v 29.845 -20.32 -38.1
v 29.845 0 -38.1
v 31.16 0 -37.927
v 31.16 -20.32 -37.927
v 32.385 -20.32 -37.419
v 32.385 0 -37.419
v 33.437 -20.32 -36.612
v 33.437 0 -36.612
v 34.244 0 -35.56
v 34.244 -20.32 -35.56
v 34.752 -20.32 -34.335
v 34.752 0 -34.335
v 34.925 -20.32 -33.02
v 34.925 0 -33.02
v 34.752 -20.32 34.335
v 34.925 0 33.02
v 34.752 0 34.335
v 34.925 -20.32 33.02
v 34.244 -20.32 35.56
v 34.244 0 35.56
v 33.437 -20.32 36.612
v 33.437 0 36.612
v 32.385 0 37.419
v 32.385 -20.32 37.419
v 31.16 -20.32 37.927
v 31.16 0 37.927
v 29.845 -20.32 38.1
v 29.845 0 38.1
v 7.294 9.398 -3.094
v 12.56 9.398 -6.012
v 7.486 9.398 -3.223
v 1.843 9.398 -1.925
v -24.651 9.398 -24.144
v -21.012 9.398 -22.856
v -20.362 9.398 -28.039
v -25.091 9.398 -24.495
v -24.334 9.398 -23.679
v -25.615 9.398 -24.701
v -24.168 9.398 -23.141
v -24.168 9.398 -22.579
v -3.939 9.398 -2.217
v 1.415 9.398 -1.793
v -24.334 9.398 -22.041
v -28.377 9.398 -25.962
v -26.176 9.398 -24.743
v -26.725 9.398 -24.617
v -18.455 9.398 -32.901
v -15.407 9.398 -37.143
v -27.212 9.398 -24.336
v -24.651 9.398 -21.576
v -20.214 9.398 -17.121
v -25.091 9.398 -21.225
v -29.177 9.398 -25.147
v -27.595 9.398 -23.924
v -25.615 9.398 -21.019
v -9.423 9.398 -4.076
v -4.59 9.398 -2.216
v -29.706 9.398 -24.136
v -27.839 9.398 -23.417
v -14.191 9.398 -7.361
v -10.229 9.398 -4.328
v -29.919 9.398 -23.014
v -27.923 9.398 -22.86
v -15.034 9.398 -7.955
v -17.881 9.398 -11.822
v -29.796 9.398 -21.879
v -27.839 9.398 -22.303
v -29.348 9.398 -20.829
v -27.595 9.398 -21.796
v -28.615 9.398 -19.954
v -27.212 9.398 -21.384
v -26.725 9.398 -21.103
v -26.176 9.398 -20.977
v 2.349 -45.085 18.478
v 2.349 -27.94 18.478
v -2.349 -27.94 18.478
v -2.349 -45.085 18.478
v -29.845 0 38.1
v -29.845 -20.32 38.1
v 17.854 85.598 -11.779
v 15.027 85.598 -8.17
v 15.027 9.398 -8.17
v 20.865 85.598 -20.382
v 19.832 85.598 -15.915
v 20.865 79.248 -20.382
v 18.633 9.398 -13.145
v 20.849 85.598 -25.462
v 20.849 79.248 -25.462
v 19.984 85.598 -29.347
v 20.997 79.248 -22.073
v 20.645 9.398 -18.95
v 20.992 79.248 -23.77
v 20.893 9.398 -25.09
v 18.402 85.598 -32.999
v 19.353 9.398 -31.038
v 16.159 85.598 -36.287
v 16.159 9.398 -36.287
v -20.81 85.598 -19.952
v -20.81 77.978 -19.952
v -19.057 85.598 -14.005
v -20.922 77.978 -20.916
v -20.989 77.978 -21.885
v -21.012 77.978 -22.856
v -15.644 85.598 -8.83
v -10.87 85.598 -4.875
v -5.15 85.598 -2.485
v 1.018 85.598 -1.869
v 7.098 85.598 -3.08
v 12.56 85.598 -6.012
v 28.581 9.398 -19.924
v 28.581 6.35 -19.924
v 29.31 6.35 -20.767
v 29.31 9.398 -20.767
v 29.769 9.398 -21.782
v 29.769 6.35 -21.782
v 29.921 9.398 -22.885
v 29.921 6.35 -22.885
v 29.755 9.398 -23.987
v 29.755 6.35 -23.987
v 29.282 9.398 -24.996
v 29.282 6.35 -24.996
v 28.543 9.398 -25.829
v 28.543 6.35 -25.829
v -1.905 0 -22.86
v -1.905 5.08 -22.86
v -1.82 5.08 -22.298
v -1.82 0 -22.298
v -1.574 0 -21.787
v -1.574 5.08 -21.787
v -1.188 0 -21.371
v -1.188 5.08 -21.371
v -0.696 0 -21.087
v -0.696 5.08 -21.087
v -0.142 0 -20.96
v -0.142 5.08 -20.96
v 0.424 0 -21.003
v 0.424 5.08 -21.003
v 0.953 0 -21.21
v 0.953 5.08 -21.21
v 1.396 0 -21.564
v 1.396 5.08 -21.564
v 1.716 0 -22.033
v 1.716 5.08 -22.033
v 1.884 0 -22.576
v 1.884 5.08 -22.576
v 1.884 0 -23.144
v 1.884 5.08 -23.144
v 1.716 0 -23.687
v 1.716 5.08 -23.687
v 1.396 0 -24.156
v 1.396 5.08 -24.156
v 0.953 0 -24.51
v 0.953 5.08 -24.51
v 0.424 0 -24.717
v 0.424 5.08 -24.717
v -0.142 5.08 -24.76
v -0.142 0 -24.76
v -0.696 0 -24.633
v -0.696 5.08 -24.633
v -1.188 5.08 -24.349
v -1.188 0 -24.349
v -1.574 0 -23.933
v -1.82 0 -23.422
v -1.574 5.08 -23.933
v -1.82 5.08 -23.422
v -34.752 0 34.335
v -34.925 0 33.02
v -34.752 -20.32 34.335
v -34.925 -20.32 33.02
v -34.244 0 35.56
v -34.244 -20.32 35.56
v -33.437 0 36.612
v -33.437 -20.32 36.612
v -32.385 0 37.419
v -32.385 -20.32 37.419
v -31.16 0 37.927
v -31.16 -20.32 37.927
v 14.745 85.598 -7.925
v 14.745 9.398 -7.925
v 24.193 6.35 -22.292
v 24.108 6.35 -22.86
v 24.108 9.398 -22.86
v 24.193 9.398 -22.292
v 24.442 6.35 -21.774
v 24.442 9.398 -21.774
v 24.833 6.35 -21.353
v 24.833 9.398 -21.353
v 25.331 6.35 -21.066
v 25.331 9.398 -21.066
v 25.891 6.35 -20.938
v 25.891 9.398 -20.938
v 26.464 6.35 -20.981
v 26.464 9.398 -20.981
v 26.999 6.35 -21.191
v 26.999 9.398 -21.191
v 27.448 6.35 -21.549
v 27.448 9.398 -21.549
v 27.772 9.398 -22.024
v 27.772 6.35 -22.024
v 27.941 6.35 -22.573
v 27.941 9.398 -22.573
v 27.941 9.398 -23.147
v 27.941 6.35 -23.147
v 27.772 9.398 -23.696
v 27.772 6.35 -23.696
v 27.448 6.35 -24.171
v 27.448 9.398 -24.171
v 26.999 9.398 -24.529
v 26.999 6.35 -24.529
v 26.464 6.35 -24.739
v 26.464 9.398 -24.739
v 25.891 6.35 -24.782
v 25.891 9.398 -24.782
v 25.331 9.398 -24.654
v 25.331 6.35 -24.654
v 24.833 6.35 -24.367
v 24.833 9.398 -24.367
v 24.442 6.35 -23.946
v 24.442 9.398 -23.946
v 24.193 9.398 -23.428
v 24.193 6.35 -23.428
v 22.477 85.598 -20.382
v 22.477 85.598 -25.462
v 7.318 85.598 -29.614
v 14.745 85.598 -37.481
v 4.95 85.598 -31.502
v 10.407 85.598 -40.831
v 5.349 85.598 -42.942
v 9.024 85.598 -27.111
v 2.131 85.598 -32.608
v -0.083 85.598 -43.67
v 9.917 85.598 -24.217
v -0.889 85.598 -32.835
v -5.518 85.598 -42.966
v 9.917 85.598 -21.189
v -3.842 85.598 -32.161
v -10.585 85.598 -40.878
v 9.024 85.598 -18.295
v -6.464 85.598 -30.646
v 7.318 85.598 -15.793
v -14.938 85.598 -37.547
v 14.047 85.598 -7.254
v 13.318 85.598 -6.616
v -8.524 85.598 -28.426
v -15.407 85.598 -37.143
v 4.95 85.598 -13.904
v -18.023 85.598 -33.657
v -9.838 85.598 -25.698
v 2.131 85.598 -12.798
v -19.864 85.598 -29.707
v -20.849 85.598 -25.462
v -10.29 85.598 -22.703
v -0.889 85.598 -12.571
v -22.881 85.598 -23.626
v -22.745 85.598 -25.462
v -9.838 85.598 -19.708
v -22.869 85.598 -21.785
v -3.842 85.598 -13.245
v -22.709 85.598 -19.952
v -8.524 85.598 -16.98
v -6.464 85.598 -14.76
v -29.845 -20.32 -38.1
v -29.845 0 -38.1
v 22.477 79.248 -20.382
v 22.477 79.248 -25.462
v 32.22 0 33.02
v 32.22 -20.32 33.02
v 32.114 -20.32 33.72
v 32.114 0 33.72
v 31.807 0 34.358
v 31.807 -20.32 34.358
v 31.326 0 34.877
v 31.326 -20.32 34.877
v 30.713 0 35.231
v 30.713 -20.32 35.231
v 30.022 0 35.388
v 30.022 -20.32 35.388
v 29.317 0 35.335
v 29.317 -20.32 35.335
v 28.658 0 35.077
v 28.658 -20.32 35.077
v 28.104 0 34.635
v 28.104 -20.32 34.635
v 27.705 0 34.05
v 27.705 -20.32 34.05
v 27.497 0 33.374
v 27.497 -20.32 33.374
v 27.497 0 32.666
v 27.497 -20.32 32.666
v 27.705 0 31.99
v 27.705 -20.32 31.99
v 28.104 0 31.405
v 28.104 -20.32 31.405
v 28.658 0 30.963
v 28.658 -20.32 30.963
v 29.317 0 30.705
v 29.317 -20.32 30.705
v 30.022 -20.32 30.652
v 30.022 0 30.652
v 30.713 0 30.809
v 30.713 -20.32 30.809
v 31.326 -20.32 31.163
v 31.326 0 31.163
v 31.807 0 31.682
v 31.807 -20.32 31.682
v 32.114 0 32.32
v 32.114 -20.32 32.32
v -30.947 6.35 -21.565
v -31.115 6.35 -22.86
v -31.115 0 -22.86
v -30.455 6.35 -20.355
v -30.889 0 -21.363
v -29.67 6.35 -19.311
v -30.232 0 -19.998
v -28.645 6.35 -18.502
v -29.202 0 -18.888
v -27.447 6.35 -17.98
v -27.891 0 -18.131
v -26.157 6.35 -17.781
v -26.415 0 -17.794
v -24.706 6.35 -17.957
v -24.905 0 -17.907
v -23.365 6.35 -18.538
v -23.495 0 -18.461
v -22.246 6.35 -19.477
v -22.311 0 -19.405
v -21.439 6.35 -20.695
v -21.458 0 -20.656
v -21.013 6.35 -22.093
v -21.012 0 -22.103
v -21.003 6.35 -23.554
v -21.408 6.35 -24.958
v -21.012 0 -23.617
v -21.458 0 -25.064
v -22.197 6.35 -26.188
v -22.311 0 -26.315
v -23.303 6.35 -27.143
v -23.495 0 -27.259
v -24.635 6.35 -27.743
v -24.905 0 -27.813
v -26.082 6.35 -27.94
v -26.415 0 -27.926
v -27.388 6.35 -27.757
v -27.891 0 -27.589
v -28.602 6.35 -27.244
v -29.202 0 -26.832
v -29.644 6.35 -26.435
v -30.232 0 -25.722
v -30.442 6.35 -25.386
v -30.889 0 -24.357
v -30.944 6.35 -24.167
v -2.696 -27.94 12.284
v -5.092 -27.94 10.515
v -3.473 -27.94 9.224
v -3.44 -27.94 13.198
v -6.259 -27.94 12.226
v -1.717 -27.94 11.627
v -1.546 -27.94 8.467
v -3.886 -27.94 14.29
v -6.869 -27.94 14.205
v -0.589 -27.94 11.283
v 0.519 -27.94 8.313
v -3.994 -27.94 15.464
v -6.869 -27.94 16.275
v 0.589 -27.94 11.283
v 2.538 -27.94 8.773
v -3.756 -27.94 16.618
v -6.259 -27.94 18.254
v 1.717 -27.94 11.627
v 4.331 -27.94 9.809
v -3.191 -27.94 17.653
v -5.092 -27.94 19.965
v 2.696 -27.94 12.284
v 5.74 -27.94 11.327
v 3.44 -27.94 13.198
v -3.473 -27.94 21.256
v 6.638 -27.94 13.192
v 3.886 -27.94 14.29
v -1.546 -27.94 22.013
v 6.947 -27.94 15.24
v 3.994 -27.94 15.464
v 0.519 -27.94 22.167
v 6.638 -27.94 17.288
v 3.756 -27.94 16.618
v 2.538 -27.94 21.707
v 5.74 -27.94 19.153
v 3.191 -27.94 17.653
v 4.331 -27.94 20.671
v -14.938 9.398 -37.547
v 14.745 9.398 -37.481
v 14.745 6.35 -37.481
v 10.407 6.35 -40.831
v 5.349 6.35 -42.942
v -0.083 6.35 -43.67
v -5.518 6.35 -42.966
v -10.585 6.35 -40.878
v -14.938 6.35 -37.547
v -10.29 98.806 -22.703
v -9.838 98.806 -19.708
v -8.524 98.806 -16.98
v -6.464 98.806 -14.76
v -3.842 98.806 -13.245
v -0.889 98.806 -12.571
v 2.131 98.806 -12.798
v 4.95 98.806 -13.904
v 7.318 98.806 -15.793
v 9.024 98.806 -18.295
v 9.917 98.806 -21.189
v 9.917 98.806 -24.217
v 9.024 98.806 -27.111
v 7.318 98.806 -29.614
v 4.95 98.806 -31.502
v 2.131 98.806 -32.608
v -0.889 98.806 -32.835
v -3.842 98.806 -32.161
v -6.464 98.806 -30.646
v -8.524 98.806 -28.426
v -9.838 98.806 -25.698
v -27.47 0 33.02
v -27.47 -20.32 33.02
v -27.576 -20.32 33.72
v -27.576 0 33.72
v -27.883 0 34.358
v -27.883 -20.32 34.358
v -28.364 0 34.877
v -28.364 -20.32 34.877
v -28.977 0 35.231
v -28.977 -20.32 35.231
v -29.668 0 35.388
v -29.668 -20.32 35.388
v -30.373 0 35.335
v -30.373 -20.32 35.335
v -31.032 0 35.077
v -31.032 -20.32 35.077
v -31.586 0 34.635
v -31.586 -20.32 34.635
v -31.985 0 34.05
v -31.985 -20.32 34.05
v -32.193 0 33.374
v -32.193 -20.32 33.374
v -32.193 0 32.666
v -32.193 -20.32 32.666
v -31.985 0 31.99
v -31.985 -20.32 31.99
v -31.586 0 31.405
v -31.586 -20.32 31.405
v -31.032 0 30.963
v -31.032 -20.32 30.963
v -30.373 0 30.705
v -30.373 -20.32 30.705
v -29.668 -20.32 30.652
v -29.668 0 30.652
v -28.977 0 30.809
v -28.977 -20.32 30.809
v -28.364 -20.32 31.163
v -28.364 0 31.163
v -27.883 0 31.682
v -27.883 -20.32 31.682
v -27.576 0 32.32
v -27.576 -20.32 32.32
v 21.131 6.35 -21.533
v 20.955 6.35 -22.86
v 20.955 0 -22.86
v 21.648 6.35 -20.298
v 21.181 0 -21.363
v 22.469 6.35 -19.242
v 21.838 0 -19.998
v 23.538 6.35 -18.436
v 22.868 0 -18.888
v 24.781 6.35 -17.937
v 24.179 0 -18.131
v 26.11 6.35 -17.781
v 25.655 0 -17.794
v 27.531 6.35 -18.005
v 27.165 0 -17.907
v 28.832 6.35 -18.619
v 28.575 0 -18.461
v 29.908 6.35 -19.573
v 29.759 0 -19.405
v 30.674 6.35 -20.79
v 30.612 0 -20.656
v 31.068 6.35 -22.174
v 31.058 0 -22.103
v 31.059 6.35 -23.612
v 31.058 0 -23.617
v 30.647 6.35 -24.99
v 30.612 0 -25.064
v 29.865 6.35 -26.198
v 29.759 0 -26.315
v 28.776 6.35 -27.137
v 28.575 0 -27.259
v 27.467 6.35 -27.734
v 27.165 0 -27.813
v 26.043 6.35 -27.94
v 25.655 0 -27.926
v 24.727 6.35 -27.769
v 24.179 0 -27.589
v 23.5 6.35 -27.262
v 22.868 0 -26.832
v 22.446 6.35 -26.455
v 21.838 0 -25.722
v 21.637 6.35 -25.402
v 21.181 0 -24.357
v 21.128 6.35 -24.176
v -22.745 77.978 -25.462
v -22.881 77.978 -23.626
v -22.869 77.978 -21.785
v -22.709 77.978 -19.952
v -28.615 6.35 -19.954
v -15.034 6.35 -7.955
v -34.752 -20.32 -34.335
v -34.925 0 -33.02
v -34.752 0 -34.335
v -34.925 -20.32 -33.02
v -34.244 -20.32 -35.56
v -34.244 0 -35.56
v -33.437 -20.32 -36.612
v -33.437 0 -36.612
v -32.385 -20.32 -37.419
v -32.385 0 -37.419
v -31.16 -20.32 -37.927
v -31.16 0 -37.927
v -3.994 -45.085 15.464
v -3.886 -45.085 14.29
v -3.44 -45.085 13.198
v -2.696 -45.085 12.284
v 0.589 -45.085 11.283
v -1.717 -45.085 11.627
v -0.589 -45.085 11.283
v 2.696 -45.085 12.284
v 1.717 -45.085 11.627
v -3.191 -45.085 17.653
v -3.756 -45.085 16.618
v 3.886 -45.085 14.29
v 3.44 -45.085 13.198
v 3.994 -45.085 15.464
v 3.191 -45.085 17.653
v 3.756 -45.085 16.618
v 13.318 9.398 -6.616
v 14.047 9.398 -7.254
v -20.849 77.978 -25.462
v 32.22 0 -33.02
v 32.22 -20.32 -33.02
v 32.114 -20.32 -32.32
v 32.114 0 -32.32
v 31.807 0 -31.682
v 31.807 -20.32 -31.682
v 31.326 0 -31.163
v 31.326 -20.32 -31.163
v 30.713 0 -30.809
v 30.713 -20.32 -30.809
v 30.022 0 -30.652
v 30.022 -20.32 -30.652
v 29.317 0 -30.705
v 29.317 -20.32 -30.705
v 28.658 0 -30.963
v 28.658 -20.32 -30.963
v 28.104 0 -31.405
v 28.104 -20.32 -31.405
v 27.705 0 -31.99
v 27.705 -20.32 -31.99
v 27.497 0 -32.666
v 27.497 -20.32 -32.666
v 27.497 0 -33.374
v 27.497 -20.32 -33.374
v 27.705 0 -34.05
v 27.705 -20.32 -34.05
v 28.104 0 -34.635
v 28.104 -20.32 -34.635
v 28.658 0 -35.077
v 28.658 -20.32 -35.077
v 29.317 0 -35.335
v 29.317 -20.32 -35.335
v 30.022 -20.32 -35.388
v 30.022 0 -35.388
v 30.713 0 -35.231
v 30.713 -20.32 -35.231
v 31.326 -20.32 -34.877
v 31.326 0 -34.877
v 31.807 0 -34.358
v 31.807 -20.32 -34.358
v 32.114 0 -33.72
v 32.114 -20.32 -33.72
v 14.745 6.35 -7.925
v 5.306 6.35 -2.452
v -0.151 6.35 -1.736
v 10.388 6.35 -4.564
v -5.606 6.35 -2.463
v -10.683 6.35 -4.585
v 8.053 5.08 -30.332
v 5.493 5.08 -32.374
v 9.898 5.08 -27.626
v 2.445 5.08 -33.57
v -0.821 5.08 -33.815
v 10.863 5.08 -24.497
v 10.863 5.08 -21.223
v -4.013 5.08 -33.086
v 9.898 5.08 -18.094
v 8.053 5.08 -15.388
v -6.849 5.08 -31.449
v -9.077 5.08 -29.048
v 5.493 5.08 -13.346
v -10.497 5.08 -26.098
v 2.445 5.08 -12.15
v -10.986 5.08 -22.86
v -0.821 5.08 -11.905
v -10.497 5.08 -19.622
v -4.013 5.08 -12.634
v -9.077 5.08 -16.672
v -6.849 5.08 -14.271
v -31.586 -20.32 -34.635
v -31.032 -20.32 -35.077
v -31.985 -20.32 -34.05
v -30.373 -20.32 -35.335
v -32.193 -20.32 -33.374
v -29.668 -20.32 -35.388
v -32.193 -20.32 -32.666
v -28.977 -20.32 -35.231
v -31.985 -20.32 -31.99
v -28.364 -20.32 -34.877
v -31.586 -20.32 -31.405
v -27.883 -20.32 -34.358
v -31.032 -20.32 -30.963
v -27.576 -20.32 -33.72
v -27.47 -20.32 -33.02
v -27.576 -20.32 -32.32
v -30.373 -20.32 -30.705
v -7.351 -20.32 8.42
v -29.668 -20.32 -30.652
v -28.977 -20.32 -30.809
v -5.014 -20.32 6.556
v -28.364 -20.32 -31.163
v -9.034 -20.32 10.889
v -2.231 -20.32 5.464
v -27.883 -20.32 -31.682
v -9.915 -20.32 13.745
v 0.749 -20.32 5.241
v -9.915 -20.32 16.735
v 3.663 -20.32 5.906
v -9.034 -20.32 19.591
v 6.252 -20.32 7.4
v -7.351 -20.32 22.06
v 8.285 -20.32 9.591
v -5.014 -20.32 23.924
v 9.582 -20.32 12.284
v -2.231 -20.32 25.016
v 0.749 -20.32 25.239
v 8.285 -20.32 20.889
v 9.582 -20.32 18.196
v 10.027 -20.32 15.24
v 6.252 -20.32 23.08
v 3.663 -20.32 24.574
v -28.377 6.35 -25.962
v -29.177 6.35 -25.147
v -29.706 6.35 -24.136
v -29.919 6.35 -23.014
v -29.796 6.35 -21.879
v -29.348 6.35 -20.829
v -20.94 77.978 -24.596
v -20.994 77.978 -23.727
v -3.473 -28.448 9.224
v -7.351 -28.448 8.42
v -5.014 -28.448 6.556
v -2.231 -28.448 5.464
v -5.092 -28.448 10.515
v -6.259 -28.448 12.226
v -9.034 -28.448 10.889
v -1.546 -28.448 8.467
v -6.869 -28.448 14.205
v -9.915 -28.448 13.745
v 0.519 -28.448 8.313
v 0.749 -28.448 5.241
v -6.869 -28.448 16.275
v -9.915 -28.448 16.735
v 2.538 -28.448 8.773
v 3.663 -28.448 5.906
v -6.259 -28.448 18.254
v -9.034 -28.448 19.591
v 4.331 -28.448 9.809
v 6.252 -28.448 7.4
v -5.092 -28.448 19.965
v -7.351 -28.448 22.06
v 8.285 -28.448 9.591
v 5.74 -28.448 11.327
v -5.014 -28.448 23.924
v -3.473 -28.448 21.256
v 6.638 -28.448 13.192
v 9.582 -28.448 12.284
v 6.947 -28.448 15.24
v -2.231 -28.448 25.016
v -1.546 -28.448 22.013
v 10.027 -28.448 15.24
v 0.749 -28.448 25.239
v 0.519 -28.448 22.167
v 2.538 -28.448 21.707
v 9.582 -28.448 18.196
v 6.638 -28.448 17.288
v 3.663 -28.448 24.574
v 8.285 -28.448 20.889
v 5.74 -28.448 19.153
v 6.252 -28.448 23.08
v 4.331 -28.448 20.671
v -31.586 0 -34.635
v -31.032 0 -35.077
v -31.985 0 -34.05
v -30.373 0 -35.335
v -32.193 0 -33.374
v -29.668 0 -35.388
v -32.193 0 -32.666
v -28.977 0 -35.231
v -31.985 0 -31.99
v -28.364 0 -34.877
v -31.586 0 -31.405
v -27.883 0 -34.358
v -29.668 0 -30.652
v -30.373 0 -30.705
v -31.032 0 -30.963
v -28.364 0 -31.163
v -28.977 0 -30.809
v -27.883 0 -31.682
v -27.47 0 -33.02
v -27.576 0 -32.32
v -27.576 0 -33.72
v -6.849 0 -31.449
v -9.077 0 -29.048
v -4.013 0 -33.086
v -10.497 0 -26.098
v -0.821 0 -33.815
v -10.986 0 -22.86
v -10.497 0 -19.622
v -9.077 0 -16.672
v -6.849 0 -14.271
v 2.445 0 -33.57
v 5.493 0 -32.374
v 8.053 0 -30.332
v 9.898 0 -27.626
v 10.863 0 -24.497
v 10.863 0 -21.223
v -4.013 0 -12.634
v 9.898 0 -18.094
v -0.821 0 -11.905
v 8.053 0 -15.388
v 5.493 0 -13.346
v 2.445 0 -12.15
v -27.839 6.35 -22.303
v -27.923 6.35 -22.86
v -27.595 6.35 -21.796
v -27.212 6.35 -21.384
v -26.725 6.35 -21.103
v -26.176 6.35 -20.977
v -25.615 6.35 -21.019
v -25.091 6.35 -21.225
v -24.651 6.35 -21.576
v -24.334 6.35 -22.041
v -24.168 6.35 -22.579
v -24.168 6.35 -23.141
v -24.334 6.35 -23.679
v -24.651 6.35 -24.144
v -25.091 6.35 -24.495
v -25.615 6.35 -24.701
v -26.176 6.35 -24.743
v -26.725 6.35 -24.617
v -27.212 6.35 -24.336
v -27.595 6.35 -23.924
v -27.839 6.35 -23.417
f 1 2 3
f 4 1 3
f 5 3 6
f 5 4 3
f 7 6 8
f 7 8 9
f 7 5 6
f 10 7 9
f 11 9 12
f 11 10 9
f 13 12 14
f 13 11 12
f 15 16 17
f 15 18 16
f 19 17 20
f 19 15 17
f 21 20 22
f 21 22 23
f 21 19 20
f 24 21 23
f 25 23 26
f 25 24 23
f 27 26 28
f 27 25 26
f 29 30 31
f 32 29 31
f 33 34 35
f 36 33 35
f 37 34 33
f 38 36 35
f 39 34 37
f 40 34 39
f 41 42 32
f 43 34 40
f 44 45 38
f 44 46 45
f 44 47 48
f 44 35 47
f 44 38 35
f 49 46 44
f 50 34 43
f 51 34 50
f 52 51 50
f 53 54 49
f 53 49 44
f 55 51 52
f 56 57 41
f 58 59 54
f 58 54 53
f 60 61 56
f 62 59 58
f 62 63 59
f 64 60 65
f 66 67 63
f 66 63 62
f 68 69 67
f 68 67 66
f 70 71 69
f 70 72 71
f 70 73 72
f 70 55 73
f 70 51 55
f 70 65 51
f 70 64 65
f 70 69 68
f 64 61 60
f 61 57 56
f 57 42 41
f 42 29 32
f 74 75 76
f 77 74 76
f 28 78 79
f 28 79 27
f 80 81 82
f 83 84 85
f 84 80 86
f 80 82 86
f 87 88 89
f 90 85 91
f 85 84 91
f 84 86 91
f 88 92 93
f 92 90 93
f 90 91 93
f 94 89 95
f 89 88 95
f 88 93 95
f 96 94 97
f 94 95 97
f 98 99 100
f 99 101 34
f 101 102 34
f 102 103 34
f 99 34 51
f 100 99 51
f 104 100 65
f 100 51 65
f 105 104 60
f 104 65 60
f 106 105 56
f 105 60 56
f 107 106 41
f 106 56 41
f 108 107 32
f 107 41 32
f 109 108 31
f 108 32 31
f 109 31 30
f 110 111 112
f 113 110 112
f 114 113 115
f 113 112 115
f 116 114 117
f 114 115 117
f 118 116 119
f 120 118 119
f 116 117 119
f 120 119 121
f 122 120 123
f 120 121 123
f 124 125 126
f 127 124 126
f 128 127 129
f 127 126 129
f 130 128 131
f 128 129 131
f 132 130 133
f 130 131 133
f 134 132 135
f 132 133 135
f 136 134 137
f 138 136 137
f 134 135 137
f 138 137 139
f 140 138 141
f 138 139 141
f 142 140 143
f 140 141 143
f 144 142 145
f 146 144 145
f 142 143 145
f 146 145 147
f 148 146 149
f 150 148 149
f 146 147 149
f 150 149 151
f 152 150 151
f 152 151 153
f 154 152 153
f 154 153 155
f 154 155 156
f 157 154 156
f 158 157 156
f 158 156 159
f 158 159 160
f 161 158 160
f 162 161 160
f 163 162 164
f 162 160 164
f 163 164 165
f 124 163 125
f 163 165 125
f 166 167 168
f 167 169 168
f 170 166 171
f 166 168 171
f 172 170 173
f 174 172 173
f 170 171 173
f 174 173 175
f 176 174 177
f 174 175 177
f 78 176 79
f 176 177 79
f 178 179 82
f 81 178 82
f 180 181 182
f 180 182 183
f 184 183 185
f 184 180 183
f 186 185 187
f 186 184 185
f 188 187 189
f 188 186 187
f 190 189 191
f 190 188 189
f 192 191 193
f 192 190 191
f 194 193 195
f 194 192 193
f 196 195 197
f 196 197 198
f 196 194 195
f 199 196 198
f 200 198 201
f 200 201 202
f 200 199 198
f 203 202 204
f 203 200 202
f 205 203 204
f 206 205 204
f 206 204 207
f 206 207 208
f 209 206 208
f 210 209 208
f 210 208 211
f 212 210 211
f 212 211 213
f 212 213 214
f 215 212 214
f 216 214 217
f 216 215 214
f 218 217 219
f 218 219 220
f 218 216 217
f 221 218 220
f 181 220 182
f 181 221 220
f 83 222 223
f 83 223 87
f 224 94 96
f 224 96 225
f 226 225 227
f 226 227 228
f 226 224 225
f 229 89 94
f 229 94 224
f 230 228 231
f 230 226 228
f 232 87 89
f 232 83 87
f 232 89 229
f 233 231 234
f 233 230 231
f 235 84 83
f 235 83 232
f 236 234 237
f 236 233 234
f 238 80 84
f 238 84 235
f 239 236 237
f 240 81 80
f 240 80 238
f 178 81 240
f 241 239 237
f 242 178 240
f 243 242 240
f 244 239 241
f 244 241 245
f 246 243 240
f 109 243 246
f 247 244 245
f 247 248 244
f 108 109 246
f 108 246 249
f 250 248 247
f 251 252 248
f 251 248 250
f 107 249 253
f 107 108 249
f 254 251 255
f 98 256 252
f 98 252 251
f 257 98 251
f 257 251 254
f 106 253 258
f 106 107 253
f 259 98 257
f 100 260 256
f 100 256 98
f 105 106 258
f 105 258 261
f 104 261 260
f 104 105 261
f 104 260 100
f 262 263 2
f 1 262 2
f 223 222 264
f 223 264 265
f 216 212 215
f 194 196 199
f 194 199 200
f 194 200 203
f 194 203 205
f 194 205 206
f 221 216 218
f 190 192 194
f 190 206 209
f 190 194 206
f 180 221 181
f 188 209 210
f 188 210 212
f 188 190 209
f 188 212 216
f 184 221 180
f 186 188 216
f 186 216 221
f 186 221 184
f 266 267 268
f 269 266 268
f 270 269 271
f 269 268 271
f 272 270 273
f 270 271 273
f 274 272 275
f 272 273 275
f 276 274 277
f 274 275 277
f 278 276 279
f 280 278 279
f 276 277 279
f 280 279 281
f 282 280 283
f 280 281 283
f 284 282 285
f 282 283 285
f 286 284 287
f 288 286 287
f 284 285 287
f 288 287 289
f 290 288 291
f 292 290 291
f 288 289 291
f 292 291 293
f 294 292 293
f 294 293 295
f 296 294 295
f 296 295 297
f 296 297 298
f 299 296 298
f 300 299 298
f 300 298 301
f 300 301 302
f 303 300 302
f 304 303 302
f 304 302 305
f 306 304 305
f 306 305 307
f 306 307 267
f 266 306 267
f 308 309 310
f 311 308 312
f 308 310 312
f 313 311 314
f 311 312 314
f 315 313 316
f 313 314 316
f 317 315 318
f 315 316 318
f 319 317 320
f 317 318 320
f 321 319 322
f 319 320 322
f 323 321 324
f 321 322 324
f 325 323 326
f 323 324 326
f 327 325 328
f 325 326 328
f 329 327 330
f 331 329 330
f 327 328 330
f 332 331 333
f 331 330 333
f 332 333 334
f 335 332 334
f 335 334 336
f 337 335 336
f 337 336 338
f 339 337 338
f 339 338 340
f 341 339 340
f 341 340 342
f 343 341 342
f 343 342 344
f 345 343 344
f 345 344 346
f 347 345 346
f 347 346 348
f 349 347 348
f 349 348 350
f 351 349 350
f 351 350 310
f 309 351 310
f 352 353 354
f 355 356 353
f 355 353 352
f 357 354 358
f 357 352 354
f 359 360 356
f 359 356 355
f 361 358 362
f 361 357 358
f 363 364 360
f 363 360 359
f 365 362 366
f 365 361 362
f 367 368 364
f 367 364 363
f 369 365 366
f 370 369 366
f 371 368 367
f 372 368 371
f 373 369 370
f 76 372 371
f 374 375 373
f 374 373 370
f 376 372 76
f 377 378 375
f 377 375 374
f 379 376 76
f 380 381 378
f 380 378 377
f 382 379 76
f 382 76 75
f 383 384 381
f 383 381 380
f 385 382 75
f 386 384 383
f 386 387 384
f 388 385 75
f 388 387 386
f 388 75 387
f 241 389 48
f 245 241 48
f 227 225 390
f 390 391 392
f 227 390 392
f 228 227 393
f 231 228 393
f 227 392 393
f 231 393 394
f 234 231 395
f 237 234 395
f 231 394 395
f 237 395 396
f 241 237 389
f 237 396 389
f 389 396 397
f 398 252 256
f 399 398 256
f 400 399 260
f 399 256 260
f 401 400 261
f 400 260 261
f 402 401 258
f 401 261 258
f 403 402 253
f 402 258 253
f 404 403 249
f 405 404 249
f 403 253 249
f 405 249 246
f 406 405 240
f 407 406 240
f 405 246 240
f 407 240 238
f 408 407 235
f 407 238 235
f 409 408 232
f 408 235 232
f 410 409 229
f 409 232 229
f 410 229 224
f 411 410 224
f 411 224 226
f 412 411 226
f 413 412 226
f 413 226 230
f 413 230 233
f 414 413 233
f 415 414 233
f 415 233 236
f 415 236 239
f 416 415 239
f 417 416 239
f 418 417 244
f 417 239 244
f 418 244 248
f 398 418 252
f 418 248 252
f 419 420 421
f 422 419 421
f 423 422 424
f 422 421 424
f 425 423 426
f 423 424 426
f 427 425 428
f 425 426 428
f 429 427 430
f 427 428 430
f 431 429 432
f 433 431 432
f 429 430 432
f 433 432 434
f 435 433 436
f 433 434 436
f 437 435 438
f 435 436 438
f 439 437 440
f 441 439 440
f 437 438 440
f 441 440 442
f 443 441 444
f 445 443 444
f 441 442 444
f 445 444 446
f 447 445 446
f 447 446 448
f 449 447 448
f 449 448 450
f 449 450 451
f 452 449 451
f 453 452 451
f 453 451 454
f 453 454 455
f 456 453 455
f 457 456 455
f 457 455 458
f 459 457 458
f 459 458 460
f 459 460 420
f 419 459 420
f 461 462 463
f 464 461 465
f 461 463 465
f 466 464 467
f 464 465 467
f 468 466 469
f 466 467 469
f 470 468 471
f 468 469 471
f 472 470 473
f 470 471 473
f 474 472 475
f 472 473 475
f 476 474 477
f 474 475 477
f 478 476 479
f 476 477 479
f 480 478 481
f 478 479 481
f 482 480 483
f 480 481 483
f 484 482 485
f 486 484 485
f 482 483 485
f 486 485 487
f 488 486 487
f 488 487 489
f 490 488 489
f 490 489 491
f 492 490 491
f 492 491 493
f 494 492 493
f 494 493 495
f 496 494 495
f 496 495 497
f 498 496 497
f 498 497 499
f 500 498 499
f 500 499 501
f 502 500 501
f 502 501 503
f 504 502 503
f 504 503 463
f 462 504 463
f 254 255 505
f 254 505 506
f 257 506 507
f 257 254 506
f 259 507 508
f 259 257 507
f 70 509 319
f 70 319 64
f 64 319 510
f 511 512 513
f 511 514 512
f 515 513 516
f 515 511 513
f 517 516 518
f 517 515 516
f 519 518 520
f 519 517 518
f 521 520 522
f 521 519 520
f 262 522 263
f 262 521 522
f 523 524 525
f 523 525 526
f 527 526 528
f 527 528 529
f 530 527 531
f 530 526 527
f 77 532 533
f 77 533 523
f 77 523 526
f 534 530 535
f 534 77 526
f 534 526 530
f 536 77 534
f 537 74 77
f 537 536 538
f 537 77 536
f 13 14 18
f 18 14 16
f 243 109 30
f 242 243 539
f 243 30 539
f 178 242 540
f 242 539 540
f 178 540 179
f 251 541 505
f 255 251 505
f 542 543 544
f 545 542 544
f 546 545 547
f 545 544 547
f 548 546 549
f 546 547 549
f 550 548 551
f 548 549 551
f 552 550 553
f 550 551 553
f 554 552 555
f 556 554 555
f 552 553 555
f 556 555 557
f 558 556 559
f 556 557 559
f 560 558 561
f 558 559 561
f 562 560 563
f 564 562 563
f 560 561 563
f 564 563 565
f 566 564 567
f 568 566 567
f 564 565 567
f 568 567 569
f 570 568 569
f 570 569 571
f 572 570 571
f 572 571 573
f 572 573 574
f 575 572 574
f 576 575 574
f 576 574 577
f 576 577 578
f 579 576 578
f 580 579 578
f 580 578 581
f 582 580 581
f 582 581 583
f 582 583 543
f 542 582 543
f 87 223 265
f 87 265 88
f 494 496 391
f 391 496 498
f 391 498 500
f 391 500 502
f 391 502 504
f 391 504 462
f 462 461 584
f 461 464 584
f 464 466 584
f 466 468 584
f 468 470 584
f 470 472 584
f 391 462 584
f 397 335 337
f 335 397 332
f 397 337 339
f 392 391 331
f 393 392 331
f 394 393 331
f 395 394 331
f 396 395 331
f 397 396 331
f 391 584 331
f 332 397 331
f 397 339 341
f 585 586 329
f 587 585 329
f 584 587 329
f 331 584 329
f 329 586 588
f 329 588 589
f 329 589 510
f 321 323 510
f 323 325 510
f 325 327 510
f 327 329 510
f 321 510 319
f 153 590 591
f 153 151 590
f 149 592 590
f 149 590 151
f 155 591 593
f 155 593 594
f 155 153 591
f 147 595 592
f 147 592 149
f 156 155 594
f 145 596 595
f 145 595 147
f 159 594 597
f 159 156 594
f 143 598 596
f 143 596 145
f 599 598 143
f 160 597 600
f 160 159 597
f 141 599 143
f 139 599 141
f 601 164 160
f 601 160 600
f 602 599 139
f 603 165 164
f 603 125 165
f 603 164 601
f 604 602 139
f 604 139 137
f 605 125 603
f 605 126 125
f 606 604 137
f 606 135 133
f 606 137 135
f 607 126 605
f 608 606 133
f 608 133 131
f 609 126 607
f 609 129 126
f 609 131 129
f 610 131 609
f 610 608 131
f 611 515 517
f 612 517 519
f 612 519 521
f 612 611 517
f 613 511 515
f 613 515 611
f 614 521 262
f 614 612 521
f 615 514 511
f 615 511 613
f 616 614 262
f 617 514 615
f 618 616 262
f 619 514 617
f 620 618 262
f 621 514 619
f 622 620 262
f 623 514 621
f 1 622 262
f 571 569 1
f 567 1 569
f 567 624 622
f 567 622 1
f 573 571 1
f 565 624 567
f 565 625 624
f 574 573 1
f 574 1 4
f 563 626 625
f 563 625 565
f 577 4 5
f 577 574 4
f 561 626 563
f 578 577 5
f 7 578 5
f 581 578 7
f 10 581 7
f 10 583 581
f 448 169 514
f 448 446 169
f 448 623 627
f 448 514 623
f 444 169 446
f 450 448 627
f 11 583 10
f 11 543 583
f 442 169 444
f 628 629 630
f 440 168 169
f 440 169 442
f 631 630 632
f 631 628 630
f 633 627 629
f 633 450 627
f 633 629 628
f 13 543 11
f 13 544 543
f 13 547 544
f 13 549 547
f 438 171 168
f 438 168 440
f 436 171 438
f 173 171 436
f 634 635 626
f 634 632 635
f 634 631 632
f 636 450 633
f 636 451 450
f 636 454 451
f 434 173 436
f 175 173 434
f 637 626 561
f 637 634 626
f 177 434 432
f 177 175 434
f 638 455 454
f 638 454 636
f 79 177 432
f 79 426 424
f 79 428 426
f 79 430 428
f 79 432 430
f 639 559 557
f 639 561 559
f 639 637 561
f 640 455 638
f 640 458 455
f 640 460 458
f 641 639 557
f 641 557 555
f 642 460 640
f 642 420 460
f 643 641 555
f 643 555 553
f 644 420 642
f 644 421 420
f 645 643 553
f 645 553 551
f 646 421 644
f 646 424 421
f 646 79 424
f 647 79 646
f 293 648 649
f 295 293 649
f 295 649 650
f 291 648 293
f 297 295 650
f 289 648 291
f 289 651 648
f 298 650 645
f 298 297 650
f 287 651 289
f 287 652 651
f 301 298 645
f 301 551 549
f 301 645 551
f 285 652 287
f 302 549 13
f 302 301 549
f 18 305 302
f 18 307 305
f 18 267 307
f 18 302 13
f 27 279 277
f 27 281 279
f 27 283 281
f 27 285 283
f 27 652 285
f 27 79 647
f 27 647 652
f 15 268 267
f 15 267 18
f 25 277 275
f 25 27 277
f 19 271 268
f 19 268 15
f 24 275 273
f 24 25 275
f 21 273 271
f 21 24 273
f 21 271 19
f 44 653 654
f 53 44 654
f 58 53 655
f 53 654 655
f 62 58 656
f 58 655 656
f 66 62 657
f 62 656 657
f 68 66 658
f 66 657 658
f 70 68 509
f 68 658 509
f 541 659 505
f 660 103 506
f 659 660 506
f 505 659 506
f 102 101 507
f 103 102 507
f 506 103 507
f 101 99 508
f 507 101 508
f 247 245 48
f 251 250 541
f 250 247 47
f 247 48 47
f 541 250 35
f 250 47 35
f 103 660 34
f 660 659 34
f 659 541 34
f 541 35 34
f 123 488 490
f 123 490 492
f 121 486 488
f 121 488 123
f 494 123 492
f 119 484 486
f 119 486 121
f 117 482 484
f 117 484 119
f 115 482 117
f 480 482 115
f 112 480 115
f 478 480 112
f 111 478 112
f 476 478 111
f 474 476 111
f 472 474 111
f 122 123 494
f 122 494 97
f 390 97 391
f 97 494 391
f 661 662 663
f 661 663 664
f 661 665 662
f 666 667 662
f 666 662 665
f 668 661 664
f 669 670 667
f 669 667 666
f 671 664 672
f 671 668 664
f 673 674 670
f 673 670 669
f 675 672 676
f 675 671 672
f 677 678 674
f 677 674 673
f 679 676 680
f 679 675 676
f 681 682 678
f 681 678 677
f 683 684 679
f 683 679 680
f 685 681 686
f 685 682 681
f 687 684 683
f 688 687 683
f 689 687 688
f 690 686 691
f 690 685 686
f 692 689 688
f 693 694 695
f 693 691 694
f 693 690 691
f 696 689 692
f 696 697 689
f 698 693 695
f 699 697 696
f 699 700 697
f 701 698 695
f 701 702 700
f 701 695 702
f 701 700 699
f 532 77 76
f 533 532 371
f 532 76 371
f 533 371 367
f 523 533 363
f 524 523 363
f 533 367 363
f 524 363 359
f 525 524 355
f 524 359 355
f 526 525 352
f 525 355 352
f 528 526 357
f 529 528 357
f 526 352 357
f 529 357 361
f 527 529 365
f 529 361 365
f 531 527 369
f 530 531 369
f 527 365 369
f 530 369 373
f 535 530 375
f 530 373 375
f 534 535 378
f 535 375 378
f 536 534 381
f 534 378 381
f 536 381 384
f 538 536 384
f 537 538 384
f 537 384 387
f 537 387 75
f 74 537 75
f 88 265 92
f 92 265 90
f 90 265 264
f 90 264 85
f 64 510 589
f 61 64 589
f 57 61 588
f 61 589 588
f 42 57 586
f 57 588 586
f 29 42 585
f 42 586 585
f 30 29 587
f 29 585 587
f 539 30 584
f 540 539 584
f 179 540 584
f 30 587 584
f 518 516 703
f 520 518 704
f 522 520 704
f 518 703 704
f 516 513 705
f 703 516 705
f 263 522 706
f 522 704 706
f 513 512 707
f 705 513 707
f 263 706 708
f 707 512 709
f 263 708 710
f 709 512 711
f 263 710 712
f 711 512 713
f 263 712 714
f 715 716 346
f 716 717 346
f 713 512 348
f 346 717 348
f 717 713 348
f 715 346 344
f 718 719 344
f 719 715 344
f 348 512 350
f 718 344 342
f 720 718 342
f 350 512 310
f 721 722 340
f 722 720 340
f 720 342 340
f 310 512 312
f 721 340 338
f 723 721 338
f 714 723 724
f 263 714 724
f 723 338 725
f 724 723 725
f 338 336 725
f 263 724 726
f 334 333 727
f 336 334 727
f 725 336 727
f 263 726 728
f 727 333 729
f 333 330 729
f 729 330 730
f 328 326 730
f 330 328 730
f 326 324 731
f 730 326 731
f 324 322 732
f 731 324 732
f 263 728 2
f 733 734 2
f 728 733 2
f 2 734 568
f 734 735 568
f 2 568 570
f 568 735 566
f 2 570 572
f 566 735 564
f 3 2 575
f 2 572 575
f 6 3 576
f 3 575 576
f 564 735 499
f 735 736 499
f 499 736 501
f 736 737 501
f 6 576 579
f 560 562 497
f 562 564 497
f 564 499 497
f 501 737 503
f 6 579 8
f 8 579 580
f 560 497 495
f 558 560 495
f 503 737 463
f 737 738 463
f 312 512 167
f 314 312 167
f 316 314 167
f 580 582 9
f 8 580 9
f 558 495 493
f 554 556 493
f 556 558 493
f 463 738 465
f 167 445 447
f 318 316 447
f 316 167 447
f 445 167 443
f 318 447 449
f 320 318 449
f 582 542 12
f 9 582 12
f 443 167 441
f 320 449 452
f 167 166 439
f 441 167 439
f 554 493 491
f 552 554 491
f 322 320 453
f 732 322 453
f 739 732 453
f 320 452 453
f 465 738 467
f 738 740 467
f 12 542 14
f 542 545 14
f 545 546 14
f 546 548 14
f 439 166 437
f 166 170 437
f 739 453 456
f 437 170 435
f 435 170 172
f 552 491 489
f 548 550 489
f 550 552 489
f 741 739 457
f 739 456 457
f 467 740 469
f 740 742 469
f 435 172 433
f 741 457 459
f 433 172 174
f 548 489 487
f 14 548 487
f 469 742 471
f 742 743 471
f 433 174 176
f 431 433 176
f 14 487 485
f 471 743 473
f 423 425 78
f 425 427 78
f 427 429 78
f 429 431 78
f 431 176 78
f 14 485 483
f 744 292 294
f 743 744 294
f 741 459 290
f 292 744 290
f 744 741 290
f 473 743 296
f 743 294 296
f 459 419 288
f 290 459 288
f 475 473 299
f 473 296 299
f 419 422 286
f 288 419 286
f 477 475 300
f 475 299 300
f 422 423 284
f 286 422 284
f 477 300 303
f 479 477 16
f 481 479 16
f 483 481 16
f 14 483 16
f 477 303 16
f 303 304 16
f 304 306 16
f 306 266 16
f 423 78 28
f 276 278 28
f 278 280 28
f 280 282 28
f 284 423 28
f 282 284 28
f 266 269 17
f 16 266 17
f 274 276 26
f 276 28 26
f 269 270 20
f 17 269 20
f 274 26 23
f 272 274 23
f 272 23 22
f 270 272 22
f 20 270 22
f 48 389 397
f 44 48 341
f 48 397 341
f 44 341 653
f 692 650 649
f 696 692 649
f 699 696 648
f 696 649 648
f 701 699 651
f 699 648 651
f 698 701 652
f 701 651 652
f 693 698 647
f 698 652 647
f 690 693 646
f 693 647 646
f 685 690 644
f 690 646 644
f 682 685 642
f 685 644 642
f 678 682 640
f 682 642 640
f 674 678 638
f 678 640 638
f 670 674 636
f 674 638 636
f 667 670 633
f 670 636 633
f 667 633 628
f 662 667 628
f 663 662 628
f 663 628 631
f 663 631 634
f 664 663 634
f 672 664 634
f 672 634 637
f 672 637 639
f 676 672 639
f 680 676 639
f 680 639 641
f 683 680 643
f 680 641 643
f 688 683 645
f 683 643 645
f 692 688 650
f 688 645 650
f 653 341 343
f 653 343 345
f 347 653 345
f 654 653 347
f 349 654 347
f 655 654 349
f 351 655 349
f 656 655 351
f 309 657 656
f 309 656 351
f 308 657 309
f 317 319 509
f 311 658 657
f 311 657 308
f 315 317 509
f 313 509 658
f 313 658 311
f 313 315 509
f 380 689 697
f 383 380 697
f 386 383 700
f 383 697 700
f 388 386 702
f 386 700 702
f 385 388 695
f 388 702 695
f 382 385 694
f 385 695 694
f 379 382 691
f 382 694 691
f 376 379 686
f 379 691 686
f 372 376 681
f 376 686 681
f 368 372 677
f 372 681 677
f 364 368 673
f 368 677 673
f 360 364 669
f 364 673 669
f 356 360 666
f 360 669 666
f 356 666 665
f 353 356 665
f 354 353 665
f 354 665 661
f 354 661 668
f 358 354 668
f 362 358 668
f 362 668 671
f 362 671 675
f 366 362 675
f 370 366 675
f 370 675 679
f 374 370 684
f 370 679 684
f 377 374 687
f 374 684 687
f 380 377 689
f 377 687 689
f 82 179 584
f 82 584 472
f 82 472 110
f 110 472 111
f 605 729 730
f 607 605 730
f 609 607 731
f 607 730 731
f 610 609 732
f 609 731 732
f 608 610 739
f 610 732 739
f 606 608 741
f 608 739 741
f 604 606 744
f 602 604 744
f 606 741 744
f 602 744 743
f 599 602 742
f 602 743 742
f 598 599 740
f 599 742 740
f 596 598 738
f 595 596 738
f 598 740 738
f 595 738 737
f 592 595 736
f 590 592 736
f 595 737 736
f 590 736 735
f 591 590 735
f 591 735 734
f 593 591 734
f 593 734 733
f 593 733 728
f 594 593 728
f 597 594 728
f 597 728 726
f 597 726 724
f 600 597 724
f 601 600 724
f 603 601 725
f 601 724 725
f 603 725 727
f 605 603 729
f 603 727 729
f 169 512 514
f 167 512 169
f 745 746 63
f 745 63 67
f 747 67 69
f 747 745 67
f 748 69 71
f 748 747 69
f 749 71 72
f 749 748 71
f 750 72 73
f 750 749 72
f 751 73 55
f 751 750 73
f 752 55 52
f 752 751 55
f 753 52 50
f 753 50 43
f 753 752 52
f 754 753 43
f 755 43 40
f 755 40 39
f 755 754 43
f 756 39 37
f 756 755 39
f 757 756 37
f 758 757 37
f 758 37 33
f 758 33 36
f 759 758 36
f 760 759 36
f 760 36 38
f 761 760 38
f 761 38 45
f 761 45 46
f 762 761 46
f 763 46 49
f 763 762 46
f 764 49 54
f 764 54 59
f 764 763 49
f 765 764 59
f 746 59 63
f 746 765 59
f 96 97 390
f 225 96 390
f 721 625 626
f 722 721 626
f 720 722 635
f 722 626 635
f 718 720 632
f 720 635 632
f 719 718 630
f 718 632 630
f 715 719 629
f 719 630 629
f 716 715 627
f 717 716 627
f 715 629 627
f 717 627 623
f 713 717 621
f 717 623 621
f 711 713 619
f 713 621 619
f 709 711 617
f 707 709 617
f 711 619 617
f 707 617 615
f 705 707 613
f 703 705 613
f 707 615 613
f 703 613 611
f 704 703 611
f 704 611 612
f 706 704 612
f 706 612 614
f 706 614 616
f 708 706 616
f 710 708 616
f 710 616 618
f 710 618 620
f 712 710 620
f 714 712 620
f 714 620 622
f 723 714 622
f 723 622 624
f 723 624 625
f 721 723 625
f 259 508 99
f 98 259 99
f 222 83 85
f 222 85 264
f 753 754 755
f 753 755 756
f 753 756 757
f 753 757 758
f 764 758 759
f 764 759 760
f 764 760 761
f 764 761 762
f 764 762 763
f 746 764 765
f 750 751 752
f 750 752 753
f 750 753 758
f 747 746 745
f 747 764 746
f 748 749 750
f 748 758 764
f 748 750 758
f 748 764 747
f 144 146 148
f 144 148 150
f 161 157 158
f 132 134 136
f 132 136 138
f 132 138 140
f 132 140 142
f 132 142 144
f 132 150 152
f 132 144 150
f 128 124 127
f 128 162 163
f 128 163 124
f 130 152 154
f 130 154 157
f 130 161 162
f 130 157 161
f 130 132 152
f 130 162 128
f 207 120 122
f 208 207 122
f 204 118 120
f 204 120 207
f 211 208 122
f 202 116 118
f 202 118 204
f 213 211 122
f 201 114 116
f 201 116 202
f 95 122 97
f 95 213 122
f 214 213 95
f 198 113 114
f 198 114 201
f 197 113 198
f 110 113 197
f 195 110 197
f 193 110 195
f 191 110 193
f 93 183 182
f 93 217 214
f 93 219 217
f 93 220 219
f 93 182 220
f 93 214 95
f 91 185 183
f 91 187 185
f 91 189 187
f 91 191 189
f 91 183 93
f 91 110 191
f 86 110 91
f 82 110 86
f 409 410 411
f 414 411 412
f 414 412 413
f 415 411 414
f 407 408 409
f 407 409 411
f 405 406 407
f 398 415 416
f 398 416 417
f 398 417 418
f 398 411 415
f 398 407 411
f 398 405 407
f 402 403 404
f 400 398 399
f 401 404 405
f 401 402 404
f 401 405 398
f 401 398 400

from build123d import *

# Parameters (mm, degrees)
F0_W      = 69.85
F0_H      = 76.2
F1_DEPTH  = 20.32
F2_R      = 5.08
F3_R      = 2.3749
F4_DEPTH  = 20.321
F5_R      = 10.0274789958
F6_DEPTH  = 8.128
F7_R      = 6.9469
F8_DEPTH  = 0.508
F10_DEPTH = 17.145
F11_R     = 10.9855
F12_DEPTH = 5.08
F11_R_2   = 5.08
F13_DEPTH = 6.35
F14_DEPTH = 6.35
F15_R     = 1.905
F16_DEPTH = 5.08
F18_R     = 1.927412261
F18_R_2   = 1.8880097215
F19_DEPTH = 3.048
F21_DEPTH = 76.2
F22_R     = 10.16
F23_DEPTH = 13.208
F25_DEPTH = 7.62
F27_DEPTH = 6.35


with BuildPart() as f1:
    # F0 (on Front) → F1 (new body)
    with BuildSketch(Plane.XZ):
        Rectangle(F0_W, F0_H)
    extrude(amount=F1_DEPTH)

    # F2
    f2_edges = [f1.edges().sort_by_distance(p)[0] for p in [
        (-34.925, -10.16, 38.1),
        (-34.925, -10.16, -38.1),
        (34.925, -10.16, -38.1),
        (34.925, -10.16, 38.1),
    ]]
    fillet(f2_edges, radius=F2_R)

    # F3 (on face) → F4 (cut, through all)
    with BuildSketch(Plane.XZ.offset(20.32)):
        with Locations((-29.845, 33.02)):
            Circle(F3_R)
        with Locations((29.845, 33.02)):
            Circle(F3_R)
        with Locations((-29.845, -33.02)):
            Circle(F3_R)
        with Locations((29.845, -33.02)):
            Circle(F3_R)
    extrude(amount=-F4_DEPTH, mode=Mode.SUBTRACT)

    # F5 (on face) → F6 (join)
    with BuildSketch(Plane.XZ.offset(20.32)):
        with Locations((0, 15.24)):
            Circle(F5_R)
    extrude(amount=F6_DEPTH)

    # F7 (on face) → F8 (cut)
    with BuildSketch(Plane.XZ.offset(28.448)):
        with Locations((0, 15.24)):
            Circle(F7_R)
    extrude(amount=-F8_DEPTH, mode=Mode.SUBTRACT)

    # F9 (on face) → F10 (join)
    with BuildSketch(Plane.XZ.offset(27.94)):
        with BuildLine():
            Line((2.3486417351, 18.4785), (-2.3486417351, 18.4785))
            ThreePointArc((-2.3486417351, 18.4785), (0, 11.2395), (2.3486417351, 18.4785))
        make_face()
    extrude(amount=F10_DEPTH)

    # F11 (on face) → F12 (join)
    with BuildSketch(Plane(origin=(0, 0, 0), x_dir=(-1, 0, 0), z_dir=(0, 1, 0))):
        with Locations((0, -22.86)):
            Circle(F11_R)
    extrude(amount=F12_DEPTH)

    # F11 (on face) → F13 (join)
    with BuildSketch(Plane(origin=(0, 0, 0), x_dir=(-1, 0, 0), z_dir=(0, 1, 0))):
        with Locations((26.035, -22.86)):
            Circle(F11_R_2)
    extrude(amount=F13_DEPTH)

    # F11 (on face) → F14 (join)
    with BuildSketch(Plane(origin=(0, 0, 0), x_dir=(-1, 0, 0), z_dir=(0, 1, 0))):
        with Locations((-26.035, -22.86)):
            Circle(F11_R_2)
    extrude(amount=F14_DEPTH)

    # F15 (on face) → F16 (cut)
    with BuildSketch(Plane(origin=(0, 5.08, 0), x_dir=(-1, 0, 0), z_dir=(0, 1, 0))):
        with Locations((0, -22.86)):
            Circle(F15_R)
    extrude(amount=-F16_DEPTH, mode=Mode.SUBTRACT)

    # F18 (on face) → F19 (join)
    with BuildSketch(Plane(origin=(0, 6.35, 0), x_dir=(-1, 0, 0), z_dir=(0, 1, 0))):
        with BuildLine():
            Line((-14.7449402664, -7.9254461452), (-28.5812491882, -19.9236759913))
            ThreePointArc((-28.5812491882, -19.9236759913), (-29.9214809801, -22.8854794861), (-28.5425313232, -25.8294562256))
            Line((-28.5425313232, -25.8294562256), (-14.7449402664, -37.4807112473))
            ThreePointArc((-14.7449402664, -37.4807112473), (0.0825790048, -43.6704553243), (14.9377645792, -37.5474069801))
            Line((14.9377645792, -37.5474069801), (28.3769337433, -25.961730155))
            ThreePointArc((28.3769337433, -25.961730155), (29.9185109104, -23.0140344812), (28.6152424237, -19.9535016519))
            Line((28.6152424237, -19.9535016519), (15.0339949064, -7.9553720766))
            ThreePointArc((15.0339949064, -7.9553720766), (0.1507626975, -1.7356597256), (-14.7449402664, -7.9254461452))
        make_face()
        with Locations((-26.035, -22.86)):
            Circle(F18_R, mode=Mode.SUBTRACT)
        with Locations((26.035, -22.86)):
            Circle(F18_R_2, mode=Mode.SUBTRACT)
    extrude(amount=F19_DEPTH)

    # F20 (on face) → F21 (join)
    with BuildSketch(Plane(origin=(0, 9.398, 0), x_dir=(-1, 0, 0), z_dir=(0, 1, 0))):
        with BuildLine():
            ThreePointArc((15.4071510025, -37.1427570095), (19.560406445, -30.5294042531), (21.0116482676, -22.8560827672))
            ThreePointArc((21.0116482676, -22.8560827672), (9.4227051618, -4.0757209402), (-12.5603957589, -6.0119199415))
            ThreePointArc((-12.5603957589, -6.0119199415), (-13.6858370585, -6.9308161687), (-14.7449402664, -7.9254461452))
            Line((-14.7449402664, -7.9254461452), (-15.0267070498, -8.16978173))
            ThreePointArc((-15.0267070498, -8.16978173), (-20.9946416555, -22.0108699669), (-16.15866039, -36.2869076608))
            Line((-16.15866039, -36.2869076608), (-14.7449402664, -37.4807112473))
            ThreePointArc((-14.7449402664, -37.4807112473), (0.0825790048, -43.6704553243), (14.9377645792, -37.5474069801))
            Line((14.9377645792, -37.5474069801), (15.4071510025, -37.1427570095))
        make_face()
    extrude(amount=F21_DEPTH)

    # F22 (on face) → F23 (join)
    with BuildSketch(Plane(origin=(0, 85.598, 0), x_dir=(-1, 0, 0), z_dir=(0, 1, 0))):
        with Locations((0.1296917782, -22.7030786963)):
            Circle(F22_R)
    extrude(amount=F23_DEPTH)

    # F24 (on face) → F25 (join)
    with BuildSketch(Plane(origin=(0, 85.598, 0), x_dir=(-1, 0, 0), z_dir=(0, 1, 0))):
        with BuildLine():
            Line((22.7089122915, -19.9516154365), (20.8099359068, -19.9516154365))
            ThreePointArc((20.8099359068, -19.9516154365), (21.0111071016, -22.7052806306), (20.8494821266, -25.4615497064))
            Line((20.8494821266, -25.4615497064), (22.7451570662, -25.4615497064))
            ThreePointArc((22.7451570662, -25.4615497064), (22.8934040546, -22.7054881808), (22.7089122915, -19.9516154365))
        make_face()
    extrude(amount=-F25_DEPTH)

    # F26 (on face) → F27 (join)
    with BuildSketch(Plane(origin=(0, 85.598, 0), x_dir=(-1, 0, 0), z_dir=(0, 1, 0))):
        with BuildLine():
            ThreePointArc((-20.8494821266, -25.4615497064), (-21.0115447656, -22.9220333613), (-20.8654271236, -20.3815497064))
            Line((-20.8654271236, -20.3815497064), (-22.4769224541, -20.3815497064))
            Line((-22.4769224541, -20.3815497064), (-22.4769224541, -25.4615497064))
            Line((-22.4769224541, -25.4615497064), (-20.8494821266, -25.4615497064))
        make_face()
    extrude(amount=-F27_DEPTH)


solid = f1.part
